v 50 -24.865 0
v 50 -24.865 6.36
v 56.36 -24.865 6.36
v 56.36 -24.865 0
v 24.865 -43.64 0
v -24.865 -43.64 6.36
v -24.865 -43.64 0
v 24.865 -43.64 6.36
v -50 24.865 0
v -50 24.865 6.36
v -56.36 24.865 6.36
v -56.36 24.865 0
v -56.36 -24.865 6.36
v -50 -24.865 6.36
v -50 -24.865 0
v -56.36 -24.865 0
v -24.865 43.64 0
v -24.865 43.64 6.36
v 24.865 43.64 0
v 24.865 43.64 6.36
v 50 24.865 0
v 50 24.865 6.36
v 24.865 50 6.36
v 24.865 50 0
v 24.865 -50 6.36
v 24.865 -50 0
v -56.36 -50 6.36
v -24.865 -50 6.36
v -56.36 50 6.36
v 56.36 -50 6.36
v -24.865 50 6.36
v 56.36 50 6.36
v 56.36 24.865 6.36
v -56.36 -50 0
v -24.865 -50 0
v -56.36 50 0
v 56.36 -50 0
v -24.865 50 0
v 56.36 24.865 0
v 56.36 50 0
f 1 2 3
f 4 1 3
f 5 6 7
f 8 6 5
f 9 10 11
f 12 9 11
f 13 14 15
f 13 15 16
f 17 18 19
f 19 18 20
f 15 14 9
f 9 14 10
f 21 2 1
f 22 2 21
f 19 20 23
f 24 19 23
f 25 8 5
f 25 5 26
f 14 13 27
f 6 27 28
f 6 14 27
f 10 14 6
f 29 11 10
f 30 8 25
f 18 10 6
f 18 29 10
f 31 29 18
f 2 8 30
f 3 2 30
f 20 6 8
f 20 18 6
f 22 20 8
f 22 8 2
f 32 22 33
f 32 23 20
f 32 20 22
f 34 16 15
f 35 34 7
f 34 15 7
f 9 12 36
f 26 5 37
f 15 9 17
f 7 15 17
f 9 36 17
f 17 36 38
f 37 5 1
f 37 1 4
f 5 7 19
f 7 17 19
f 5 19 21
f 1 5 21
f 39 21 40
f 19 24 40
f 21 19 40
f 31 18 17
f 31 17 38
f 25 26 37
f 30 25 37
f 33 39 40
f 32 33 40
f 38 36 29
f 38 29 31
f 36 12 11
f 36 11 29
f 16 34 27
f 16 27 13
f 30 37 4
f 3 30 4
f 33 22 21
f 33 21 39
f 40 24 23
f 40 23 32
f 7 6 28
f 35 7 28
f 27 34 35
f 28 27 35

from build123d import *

# Parameters (mm, degrees)
SKETCH1_W           = 112.72
SKETCH1_H           = 100
BOSS_EXTRUDE1_DEPTH = 6.36
SKETCH10_W          = 49.73
SKETCH10_H          = 6.36
CUT_EXTRUDE1_DEPTH  = 76.610179209
SKETCH11_W          = 6.36
SKETCH11_H          = 49.73
CUT_EXTRUDE2_DEPTH  = 76.610179209


with BuildPart() as part:
    # Sketch1 → Boss-Extrude1 (new body)
    with BuildSketch(Plane.XY):
        Rectangle(SKETCH1_W, SKETCH1_H)
    extrude(amount=BOSS_EXTRUDE1_DEPTH)

    # Sketch10 → Cut-Extrude1 (cut, through all)
    with BuildSketch(Plane.XY.offset(6.36)):
        with Locations((0, 46.82)):
            Rectangle(SKETCH10_W, SKETCH10_H)
    cut_extrude1 = extrude(amount=-CUT_EXTRUDE1_DEPTH, mode=Mode.SUBTRACT)

    # Mirror6: Cut-Extrude1 across plane
    add(cut_extrude1.mirror(Plane.ZX), mode=Mode.SUBTRACT)

    # Sketch11 → Cut-Extrude2 (cut, through all)
    with BuildSketch(Plane.XY.offset(6.36)):
        with Locations((53.18, 0)):
            Rectangle(SKETCH11_W, SKETCH11_H)
    cut_extrude2 = extrude(amount=-CUT_EXTRUDE2_DEPTH, mode=Mode.SUBTRACT)

    # Mirror7: Cut-Extrude2 across plane
    add(cut_extrude2.mirror(Plane(origin=(0, 0, 0), x_dir=(0, 0, 1), z_dir=(1, 0, 0))), mode=Mode.SUBTRACT)


solid = part.part
